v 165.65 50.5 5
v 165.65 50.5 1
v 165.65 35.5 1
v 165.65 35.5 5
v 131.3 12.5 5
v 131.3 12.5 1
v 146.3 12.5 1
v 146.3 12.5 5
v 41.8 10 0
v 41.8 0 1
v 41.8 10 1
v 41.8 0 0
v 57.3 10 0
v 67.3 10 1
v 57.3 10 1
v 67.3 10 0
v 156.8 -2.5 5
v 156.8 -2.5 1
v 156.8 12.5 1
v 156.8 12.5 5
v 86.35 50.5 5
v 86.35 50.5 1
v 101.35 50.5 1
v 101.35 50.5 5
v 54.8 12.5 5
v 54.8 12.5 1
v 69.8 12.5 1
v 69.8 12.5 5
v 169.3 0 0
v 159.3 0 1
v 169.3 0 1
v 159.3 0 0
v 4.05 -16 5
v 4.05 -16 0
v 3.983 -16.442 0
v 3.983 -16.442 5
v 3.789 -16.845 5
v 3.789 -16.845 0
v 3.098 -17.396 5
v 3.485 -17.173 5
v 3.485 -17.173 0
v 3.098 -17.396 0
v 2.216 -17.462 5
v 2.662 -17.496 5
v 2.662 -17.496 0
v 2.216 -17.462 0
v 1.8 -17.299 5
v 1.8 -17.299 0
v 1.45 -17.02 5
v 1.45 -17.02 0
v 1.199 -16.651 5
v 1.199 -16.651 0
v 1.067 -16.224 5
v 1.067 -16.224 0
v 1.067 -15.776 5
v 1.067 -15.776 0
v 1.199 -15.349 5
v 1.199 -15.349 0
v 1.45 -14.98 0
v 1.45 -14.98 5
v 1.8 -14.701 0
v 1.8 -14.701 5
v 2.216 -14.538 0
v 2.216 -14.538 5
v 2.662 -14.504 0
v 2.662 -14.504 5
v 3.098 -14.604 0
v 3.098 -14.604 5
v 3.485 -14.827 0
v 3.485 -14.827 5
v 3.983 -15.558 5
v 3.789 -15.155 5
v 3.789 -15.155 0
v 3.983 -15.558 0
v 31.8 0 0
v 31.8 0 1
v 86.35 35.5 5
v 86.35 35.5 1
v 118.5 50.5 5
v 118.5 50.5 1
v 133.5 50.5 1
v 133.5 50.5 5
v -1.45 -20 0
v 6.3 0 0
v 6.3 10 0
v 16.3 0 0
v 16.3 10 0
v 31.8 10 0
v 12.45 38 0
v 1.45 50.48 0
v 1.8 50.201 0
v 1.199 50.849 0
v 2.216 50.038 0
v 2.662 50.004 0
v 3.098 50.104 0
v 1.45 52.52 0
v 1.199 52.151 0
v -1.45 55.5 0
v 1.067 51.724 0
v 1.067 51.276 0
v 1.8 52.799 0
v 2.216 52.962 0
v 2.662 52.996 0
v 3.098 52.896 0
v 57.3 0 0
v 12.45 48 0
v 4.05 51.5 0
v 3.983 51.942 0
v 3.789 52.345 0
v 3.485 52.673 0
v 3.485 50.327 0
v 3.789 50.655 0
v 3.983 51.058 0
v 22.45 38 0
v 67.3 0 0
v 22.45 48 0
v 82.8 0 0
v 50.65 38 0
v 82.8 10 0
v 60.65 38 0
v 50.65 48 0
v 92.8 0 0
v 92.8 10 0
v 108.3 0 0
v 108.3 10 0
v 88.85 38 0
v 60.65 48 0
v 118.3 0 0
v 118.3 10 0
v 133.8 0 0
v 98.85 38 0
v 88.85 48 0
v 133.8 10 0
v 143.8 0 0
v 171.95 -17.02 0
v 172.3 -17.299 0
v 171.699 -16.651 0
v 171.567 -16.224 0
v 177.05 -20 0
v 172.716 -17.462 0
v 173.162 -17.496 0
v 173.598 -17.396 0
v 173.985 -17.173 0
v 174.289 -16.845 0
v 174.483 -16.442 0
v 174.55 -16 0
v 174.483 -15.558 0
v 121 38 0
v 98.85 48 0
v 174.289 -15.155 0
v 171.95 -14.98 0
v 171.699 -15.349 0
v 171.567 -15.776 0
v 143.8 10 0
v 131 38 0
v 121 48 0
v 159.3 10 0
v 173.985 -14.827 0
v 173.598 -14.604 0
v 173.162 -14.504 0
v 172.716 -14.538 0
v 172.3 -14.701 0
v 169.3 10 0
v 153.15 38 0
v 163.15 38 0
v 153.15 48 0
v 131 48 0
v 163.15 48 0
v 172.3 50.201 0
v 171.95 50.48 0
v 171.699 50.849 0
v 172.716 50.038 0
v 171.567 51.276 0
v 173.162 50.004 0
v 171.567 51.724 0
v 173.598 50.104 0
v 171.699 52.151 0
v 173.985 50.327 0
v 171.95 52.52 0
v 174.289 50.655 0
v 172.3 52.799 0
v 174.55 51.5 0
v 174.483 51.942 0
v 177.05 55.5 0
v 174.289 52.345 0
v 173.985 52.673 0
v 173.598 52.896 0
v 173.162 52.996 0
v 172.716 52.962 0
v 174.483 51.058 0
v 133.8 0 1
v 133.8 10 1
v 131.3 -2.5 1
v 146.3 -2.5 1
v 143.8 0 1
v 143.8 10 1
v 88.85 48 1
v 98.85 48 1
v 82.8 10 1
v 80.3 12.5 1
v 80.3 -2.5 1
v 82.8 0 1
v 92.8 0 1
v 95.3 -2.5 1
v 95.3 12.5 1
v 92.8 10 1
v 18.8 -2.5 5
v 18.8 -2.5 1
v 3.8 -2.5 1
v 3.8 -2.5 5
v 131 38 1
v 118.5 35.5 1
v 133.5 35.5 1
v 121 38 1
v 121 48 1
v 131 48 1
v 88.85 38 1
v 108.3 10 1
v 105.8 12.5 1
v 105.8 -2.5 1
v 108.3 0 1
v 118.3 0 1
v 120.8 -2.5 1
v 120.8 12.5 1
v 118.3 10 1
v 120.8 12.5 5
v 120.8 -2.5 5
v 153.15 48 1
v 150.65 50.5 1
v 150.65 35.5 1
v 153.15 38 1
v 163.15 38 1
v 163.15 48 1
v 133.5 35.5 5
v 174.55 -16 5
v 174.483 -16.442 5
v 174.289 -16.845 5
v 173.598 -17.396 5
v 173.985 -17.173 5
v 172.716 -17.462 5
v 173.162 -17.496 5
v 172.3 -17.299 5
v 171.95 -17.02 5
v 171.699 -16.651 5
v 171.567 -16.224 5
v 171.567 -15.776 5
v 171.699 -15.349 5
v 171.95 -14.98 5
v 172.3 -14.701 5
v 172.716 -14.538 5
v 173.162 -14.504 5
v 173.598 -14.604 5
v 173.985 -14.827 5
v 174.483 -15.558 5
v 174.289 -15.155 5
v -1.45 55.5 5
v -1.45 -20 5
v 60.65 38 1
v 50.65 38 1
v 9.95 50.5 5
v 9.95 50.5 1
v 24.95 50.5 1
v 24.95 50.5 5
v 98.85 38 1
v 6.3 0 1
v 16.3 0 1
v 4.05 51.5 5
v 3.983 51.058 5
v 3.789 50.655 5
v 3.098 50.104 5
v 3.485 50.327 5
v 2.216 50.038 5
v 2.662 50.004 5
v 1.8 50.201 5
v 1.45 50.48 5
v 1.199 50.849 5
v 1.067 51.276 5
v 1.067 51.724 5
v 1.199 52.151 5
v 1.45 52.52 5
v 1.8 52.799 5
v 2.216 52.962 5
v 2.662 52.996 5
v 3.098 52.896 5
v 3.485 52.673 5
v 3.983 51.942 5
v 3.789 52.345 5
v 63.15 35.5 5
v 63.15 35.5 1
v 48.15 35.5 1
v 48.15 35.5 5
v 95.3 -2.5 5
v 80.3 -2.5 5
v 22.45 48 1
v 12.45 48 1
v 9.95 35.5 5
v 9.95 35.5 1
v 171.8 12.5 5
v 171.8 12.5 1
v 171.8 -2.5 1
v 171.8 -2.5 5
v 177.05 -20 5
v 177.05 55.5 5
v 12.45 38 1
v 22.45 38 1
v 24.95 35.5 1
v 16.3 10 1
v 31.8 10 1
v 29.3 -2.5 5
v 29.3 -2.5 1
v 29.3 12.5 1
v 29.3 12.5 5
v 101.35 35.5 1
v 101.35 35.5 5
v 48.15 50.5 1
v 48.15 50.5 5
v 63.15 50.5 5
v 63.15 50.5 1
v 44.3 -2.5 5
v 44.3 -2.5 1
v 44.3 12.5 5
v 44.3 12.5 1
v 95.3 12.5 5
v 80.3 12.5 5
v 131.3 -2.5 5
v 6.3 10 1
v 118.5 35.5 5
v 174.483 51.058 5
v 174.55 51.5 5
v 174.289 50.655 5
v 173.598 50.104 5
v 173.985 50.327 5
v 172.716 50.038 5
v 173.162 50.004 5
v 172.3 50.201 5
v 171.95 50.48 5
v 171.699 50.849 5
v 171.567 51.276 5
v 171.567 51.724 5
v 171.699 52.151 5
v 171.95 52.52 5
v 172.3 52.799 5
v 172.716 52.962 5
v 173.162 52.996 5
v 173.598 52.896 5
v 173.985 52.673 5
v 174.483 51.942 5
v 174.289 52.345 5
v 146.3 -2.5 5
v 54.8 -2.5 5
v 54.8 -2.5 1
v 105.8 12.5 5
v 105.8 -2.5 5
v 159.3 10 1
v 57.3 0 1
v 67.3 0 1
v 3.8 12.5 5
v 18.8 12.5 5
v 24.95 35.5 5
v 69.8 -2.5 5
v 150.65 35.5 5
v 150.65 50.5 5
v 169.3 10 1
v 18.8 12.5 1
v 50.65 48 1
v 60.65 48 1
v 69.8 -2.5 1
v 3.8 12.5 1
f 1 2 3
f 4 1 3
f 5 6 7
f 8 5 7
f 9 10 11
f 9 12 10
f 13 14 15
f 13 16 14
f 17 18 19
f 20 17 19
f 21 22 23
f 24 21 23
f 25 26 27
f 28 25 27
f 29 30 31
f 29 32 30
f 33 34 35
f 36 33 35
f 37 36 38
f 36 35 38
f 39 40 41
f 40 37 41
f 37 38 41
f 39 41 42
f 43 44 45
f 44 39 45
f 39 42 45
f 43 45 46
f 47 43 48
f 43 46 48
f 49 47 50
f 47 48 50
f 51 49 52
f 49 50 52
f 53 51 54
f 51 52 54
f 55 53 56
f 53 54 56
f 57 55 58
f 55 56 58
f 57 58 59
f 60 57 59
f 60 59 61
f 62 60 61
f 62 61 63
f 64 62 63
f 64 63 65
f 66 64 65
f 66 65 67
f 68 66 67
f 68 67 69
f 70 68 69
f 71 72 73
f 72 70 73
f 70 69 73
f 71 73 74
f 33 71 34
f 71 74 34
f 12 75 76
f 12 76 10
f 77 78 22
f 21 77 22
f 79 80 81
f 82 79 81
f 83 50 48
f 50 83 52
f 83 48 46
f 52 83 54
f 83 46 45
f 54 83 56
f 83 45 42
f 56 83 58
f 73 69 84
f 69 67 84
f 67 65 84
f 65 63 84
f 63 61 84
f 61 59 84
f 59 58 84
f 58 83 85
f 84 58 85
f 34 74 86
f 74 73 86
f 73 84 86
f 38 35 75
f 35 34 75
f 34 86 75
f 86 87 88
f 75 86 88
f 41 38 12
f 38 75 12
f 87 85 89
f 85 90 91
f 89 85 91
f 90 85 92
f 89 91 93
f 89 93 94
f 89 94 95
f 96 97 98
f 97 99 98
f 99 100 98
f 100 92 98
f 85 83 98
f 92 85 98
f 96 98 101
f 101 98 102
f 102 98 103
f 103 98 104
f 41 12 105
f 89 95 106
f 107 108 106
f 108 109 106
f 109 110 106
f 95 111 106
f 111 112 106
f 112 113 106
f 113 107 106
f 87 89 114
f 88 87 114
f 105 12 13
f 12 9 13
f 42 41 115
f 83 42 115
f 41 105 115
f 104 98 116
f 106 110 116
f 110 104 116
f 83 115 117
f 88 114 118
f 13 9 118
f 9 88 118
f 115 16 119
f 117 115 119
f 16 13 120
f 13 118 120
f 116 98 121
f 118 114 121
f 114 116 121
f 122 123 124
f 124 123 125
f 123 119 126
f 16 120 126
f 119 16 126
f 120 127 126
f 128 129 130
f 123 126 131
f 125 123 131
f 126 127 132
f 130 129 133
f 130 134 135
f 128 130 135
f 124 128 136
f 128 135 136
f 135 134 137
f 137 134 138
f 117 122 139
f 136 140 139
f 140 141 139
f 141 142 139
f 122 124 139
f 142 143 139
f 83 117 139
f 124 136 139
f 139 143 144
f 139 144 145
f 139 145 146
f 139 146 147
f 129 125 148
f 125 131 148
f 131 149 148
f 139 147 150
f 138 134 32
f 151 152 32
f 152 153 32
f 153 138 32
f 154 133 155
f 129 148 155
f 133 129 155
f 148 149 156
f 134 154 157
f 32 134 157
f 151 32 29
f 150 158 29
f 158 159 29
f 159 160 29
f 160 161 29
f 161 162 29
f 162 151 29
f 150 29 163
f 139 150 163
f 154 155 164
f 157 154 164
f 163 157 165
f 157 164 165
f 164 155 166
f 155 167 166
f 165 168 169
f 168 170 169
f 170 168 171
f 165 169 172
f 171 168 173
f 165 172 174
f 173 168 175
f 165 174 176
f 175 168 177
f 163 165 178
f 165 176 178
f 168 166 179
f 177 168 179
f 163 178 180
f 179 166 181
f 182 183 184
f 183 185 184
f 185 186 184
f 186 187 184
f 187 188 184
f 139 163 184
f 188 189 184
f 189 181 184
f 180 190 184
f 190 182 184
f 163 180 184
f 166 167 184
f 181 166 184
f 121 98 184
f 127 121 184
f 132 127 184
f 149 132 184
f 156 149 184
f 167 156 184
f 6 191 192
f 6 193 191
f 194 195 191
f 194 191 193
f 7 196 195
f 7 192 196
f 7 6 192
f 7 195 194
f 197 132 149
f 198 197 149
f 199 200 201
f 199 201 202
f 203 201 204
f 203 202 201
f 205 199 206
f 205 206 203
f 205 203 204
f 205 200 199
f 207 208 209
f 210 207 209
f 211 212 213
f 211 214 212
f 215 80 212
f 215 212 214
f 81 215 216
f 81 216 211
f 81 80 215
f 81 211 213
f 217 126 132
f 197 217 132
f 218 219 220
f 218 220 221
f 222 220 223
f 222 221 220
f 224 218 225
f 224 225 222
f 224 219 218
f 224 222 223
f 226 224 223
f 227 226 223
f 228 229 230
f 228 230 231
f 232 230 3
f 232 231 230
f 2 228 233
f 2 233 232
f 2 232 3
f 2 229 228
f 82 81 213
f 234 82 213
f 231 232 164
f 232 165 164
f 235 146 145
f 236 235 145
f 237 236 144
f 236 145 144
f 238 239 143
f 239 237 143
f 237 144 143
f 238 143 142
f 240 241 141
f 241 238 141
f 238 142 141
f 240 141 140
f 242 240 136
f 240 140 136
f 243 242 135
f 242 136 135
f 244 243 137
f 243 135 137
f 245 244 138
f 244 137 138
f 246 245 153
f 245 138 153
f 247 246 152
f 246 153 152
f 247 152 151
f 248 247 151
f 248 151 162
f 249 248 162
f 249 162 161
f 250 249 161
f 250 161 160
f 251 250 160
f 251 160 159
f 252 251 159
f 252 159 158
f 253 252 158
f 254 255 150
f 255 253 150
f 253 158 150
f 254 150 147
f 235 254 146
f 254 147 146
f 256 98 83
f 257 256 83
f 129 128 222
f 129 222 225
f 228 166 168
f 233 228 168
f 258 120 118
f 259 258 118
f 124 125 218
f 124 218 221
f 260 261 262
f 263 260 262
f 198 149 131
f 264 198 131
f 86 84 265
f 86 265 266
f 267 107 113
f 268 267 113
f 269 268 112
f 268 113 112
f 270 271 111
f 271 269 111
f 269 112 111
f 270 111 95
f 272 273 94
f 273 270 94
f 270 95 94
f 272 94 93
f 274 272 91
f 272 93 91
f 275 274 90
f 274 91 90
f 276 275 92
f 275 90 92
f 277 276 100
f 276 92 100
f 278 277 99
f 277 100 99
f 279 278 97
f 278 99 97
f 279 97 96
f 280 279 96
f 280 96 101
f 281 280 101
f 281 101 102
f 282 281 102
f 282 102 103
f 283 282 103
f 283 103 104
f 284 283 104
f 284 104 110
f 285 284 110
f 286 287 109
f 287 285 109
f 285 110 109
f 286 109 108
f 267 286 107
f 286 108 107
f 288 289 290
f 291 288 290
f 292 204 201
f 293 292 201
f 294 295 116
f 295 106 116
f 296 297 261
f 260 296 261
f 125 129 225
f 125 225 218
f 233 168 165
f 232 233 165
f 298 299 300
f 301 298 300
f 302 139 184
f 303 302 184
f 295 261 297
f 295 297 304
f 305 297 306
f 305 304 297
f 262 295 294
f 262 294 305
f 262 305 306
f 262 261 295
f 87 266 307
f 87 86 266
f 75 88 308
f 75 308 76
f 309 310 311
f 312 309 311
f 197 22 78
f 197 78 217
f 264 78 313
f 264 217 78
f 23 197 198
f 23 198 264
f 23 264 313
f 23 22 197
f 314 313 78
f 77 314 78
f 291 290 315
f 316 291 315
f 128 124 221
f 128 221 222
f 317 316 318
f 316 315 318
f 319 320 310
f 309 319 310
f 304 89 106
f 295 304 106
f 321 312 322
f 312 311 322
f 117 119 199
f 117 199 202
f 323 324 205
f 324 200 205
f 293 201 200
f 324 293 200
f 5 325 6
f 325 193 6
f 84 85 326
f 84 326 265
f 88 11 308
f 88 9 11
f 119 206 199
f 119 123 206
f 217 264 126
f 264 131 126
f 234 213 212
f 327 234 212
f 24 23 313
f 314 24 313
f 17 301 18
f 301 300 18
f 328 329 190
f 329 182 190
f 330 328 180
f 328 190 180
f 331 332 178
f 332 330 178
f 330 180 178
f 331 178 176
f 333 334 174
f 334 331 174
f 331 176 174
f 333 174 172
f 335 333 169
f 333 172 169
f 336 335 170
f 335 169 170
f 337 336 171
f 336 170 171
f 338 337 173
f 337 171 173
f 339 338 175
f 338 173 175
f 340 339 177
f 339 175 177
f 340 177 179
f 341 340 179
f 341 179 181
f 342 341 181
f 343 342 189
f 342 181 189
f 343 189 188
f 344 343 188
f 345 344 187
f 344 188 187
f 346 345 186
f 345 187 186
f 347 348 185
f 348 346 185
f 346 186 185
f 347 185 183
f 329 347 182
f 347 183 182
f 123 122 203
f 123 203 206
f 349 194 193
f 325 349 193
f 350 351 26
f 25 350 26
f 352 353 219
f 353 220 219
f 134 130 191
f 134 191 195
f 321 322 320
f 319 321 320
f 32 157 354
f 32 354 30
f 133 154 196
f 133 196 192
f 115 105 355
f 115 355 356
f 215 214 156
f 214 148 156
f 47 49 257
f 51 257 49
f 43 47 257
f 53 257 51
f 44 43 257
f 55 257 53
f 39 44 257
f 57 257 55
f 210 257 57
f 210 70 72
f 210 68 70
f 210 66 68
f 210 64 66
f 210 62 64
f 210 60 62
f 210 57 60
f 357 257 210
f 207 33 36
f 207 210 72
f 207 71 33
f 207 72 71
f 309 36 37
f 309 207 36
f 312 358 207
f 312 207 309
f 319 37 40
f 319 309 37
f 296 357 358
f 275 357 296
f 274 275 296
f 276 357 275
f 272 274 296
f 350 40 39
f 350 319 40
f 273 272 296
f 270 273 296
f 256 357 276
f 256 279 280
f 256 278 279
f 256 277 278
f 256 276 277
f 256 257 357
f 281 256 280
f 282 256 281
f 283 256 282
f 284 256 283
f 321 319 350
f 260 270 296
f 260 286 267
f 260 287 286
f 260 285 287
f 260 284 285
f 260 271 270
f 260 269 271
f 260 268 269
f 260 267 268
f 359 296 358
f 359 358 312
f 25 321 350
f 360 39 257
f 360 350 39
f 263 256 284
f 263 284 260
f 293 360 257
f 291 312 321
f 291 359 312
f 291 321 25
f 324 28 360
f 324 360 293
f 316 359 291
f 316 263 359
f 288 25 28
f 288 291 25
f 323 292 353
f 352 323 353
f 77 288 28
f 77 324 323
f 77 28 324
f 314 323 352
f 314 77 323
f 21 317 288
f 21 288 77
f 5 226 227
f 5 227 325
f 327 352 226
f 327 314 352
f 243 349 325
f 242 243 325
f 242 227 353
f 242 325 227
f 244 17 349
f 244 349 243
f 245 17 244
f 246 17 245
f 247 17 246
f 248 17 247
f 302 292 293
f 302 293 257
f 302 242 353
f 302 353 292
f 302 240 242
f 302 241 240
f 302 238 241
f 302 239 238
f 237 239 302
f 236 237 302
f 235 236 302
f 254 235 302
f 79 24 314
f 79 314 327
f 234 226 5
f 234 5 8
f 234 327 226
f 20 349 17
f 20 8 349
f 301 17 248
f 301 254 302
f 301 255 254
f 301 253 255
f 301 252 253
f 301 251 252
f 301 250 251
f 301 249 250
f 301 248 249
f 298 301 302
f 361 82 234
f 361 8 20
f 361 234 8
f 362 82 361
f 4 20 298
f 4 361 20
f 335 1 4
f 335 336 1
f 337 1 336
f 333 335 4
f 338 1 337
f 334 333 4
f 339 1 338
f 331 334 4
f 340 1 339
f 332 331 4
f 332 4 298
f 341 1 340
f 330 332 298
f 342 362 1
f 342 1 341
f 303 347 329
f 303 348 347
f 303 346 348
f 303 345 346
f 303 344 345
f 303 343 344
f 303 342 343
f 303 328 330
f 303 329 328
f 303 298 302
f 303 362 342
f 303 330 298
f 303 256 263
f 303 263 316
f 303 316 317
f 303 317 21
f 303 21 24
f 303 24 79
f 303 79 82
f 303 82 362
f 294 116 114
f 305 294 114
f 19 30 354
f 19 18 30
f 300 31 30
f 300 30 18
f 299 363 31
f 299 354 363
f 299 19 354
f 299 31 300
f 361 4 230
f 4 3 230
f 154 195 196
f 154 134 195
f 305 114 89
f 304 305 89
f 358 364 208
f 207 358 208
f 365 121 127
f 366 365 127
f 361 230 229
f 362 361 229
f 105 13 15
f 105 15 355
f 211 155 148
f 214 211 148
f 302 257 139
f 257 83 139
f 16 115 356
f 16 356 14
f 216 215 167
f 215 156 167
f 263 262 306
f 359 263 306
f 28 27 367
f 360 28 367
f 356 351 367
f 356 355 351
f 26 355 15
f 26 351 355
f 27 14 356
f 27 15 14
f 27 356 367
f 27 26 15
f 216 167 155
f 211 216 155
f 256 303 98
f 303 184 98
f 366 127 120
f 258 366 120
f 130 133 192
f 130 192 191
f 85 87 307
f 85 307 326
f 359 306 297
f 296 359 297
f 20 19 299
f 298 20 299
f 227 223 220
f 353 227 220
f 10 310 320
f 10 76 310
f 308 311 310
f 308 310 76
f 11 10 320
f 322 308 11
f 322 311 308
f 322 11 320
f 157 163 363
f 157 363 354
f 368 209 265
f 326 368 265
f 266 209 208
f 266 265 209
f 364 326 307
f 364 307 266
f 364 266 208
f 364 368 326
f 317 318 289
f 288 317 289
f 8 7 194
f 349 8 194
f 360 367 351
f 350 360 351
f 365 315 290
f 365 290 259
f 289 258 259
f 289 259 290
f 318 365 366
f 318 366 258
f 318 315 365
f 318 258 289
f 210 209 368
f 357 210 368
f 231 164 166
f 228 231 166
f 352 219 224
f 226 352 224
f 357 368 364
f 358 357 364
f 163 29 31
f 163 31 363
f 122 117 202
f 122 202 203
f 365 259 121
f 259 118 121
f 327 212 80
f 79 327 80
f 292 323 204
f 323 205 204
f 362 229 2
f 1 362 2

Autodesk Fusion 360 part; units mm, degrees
sketch "Sketch1" plane through (0, 0, 0) normal (0, 0, 1) x (1, 0, 0)
  line L0 (-23.9041, 0) -> (63.45, 0) construction
  line L1 (78.95, 0) -> (176.0959, 0) construction
  line L2 (-1.45, -20) -> (177.05, -20)
  line L3 (177.05, -20) -> (177.05, 55.5)
  line L4 (177.05, 55.5) -> (-1.45, 55.5)
  line L5 (-1.45, 55.5) -> (-1.45, -20)
  line L6 (6.3, 0) -> (16.3, 0)
  line L7 (16.3, 0) -> (16.3, 10)
  line L8 (16.3, 10) -> (6.3, 10)
  line L9 (6.3, 10) -> (6.3, 0)
  line L10 (31.8, 0) -> (41.8, 0)
  line L11 (41.8, 0) -> (41.8, 10)
  line L12 (41.8, 10) -> (31.8, 10)
  line L13 (31.8, 10) -> (31.8, 0)
  line L14 (57.3, 0) -> (67.3, 0)
  line L15 (67.3, 0) -> (67.3, 10)
  line L16 (67.3, 10) -> (57.3, 10)
  line L17 (57.3, 10) -> (57.3, 0)
  line L18 (82.8, 0) -> (92.8, 0)
  line L19 (92.8, 0) -> (92.8, 10)
  line L20 (92.8, 10) -> (82.8, 10)
  line L21 (82.8, 10) -> (82.8, 0)
  line L22 (108.3, 0) -> (118.3, 0)
  line L23 (118.3, 0) -> (118.3, 10)
  line L24 (118.3, 10) -> (108.3, 10)
  line L25 (108.3, 10) -> (108.3, 0)
  line L26 (133.8, 0) -> (143.8, 0)
  line L27 (143.8, 0) -> (143.8, 10)
  line L28 (143.8, 10) -> (133.8, 10)
  line L29 (133.8, 10) -> (133.8, 0)
  line L30 (159.3, 0) -> (169.3, 0)
  line L31 (169.3, 0) -> (169.3, 10)
  line L32 (169.3, 10) -> (159.3, 10)
  line L33 (159.3, 10) -> (159.3, 0)
  line L34 (12.45, 48) -> (22.45, 48)
  line L35 (22.45, 48) -> (22.45, 38)
  line L36 (22.45, 38) -> (12.45, 38)
  line L37 (12.45, 38) -> (12.45, 48)
  line L38 (50.65, 48) -> (60.65, 48)
  line L39 (60.65, 48) -> (60.65, 38)
  line L40 (60.65, 38) -> (50.65, 38)
  line L41 (50.65, 38) -> (50.65, 48)
  line L42 (88.85, 48) -> (98.85, 48)
  line L43 (98.85, 48) -> (98.85, 38)
  line L44 (98.85, 38) -> (88.85, 38)
  line L45 (88.85, 38) -> (88.85, 48)
  line L46 (121, 48) -> (131, 48)
  line L47 (131, 48) -> (131, 38)
  line L48 (131, 38) -> (121, 38)
  line L49 (121, 38) -> (121, 48)
  line L50 (153.15, 48) -> (163.15, 48)
  line L51 (163.15, 48) -> (163.15, 38)
  line L52 (163.15, 38) -> (153.15, 38)
  line L53 (153.15, 38) -> (153.15, 48)
  line L54 (9.95, 50.5) -> (24.95, 50.5)
  line L55 (24.95, 50.5) -> (24.95, 35.5)
  line L56 (24.95, 35.5) -> (9.95, 35.5)
  line L57 (9.95, 35.5) -> (9.95, 50.5)
  line L58 (9.95, 50.5) -> (24.95, 35.5) construction
  line L59 (24.95, 50.5) -> (9.95, 35.5) construction
  line L60 (48.15, 50.5) -> (63.15, 50.5)
  line L61 (63.15, 50.5) -> (63.15, 35.5)
  line L62 (63.15, 35.5) -> (48.15, 35.5)
  line L63 (48.15, 35.5) -> (48.15, 50.5)
  line L64 (48.15, 50.5) -> (63.15, 35.5) construction
  line L65 (63.15, 50.5) -> (48.15, 35.5) construction
  line L66 (86.35, 50.5) -> (101.35, 50.5)
  line L67 (101.35, 50.5) -> (101.35, 35.5)
  line L68 (101.35, 35.5) -> (86.35, 35.5)
  line L69 (86.35, 35.5) -> (86.35, 50.5)
  line L70 (86.35, 50.5) -> (101.35, 35.5) construction
  line L71 (101.35, 50.5) -> (86.35, 35.5) construction
  line L72 (118.5, 50.5) -> (133.5, 50.5)
  line L73 (133.5, 50.5) -> (133.5, 35.5)
  line L74 (133.5, 35.5) -> (118.5, 35.5)
  line L75 (118.5, 35.5) -> (118.5, 50.5)
  line L76 (118.5, 50.5) -> (133.5, 35.5) construction
  line L77 (133.5, 50.5) -> (118.5, 35.5) construction
  line L78 (150.65, 50.5) -> (165.65, 50.5)
  line L79 (165.65, 50.5) -> (165.65, 35.5)
  line L80 (165.65, 35.5) -> (150.65, 35.5)
  line L81 (150.65, 35.5) -> (150.65, 50.5)
  line L82 (150.65, 50.5) -> (165.65, 35.5) construction
  line L83 (165.65, 50.5) -> (150.65, 35.5) construction
  line L84 (3.8, 12.5) -> (18.8, 12.5)
  line L85 (18.8, 12.5) -> (18.8, -2.5)
  line L86 (18.8, -2.5) -> (3.8, -2.5)
  line L87 (3.8, -2.5) -> (3.8, 12.5)
  line L88 (3.8, 12.5) -> (18.8, -2.5) construction
  line L89 (18.8, 12.5) -> (3.8, -2.5) construction
  line L90 (29.3, 12.5) -> (44.3, 12.5)
  line L91 (44.3, 12.5) -> (44.3, -2.5)
  line L92 (44.3, -2.5) -> (29.3, -2.5)
  line L93 (29.3, -2.5) -> (29.3, 12.5)
  line L94 (29.3, 12.5) -> (44.3, -2.5) construction
  line L95 (44.3, 12.5) -> (29.3, -2.5) construction
  line L96 (54.8, 12.5) -> (69.8, 12.5)
  line L97 (69.8, 12.5) -> (69.8, -2.5)
  line L98 (69.8, -2.5) -> (54.8, -2.5)
  line L99 (54.8, -2.5) -> (54.8, 12.5)
  line L100 (54.8, 12.5) -> (69.8, -2.5) construction
  line L101 (69.8, 12.5) -> (54.8, -2.5) construction
  line L102 (80.3, 12.5) -> (95.3, 12.5)
  line L103 (95.3, 12.5) -> (95.3, -2.5)
  line L104 (95.3, -2.5) -> (80.3, -2.5)
  line L105 (80.3, -2.5) -> (80.3, 12.5)
  line L106 (80.3, 12.5) -> (95.3, -2.5) construction
  line L107 (95.3, 12.5) -> (80.3, -2.5) construction
  line L108 (105.8, 12.5) -> (120.8, 12.5)
  line L109 (120.8, 12.5) -> (120.8, -2.5)
  line L110 (120.8, -2.5) -> (105.8, -2.5)
  line L111 (105.8, -2.5) -> (105.8, 12.5)
  line L112 (105.8, 12.5) -> (120.8, -2.5) construction
  line L113 (120.8, 12.5) -> (105.8, -2.5) construction
  line L114 (131.3, 12.5) -> (146.3, 12.5)
  line L115 (146.3, 12.5) -> (146.3, -2.5)
  line L116 (146.3, -2.5) -> (131.3, -2.5)
  line L117 (131.3, -2.5) -> (131.3, 12.5)
  line L118 (131.3, 12.5) -> (146.3, -2.5) construction
  line L119 (146.3, 12.5) -> (131.3, -2.5) construction
  line L120 (156.8, 12.5) -> (171.8, 12.5)
  line L121 (171.8, 12.5) -> (171.8, -2.5)
  line L122 (171.8, -2.5) -> (156.8, -2.5)
  line L123 (156.8, -2.5) -> (156.8, 12.5)
  line L124 (156.8, 12.5) -> (171.8, -2.5) construction
  line L125 (171.8, 12.5) -> (156.8, -2.5) construction
  circle A0 centre (2.55, 51.5) radius 1.5
  circle A1 centre (2.55, -16) radius 1.5
  circle A2 centre (173.05, -16) radius 1.5
  circle A3 centre (173.05, 51.5) radius 1.5
  point P0 (-11.7503, 0.5527)
  point P1 (17.45, 43)
  point P2 (55.65, 43)
  point P3 (93.85, 43)
  point P4 (126, 43)
  point P5 (158.15, 43)
  point P6 (11.3, 5)
  point P7 (36.8, 5)
  point P8 (62.3, 5)
  point P9 (87.8, 5)
  point P10 (113.3, 5)
  point P11 (138.8, 5)
  point P12 (164.3, 5)
  dimension "d77" = 200
  dimension "d86" = 75.5
  dimension "d89" = 10
  dimension "d90" = 10
  dimension "d91" = 20
  dimension "d92" = 7.75
  dimension "d93" = 10
  dimension "d94" = 10
  dimension "d95" = 10
  dimension "d96" = 10
  dimension "d99" = 10
  dimension "d100" = 10
  dimension "d101" = 15.5
  dimension "d102" = 15.5
  dimension "d104" = 15.5
  dimension "d105" = 10
  dimension "d106" = 10
  dimension "d107" = 15.5
  dimension "d108" = 10
  dimension "d109" = 10
  dimension "d110" = 15.5
  dimension "d111" = 10
  dimension "d112" = 10
  dimension "d113" = 15.5
  dimension "d114" = 10
  dimension "d115" = 10
  dimension "d116" = 13.9
  dimension "d117" = 7.5
  dimension "d118" = 10
  dimension "d119" = 10
  dimension "d120" = 7.5
  dimension "d121" = 28.2
  dimension "d122" = 10
  dimension "d123" = 10
  dimension "d124" = 28.2
  dimension "d125" = 7.5
  dimension "d126" = 10
  dimension "d127" = 10
  dimension "d128" = 22.15
  dimension "d129" = 7.5
  dimension "d130" = 10
  dimension "d131" = 10
  dimension "d132" = 22.15
  dimension "d133" = 7.5
  dimension "d134" = 15
  dimension "d135" = 15
  dimension "d136" = 15
  dimension "d137" = 15
  dimension "d138" = 15
  dimension "d139" = 15
  dimension "d140" = 15
  dimension "d141" = 15
  dimension "d142" = 15
  dimension "d143" = 15
  dimension "d144" = 15
  dimension "d145" = 15
  dimension "d146" = 15
  dimension "d147" = 15
  dimension "d148" = 15
  dimension "d149" = 15
  dimension "d150" = 15
  dimension "d151" = 15
  dimension "d152" = 15
  dimension "d153" = 15
  dimension "d154" = 15
  dimension "d155" = 15
  dimension "d156" = 15
  dimension "d157" = 15
  dimension "d158" = 3
  dimension "d159" = 4
  dimension "d160" = 4
  dimension "d161" = 3
  dimension "d162" = 4
  dimension "d163" = 4
  dimension "d164" = 3
  dimension "d165" = 4
  dimension "d166" = 4
  dimension "d167" = 3
  dimension "d168" = 4
  dimension "d169" = 4
  dimension "d174" = 2.5
  dimension "d175" = 2.5
  dimension "d176" = 2.5
  dimension "d177" = 2.5
  dimension "d178" = 2.5
  dimension "d179" = 2.5
  dimension "d182" = 5.25
  dimension "d183" = 2.5
  dimension "d184" = 2.5
  dimension "d185" = 2.5
  dimension "d186" = 2.5
  dimension "d187" = 2.5
  dimension "d188" = 2.5
  dimension "d189" = 2.5
  dimension "d190" = 2.5
  dimension "d191" = 2.5
  dimension "d192" = 2.5
  dimension "d193" = 2.5
extrude "Extrude1" add sketch "Sketch1" along normal blind 1 contours L54 L55 L56 L57 | L60 L61 L62 L63 | L66 L67 L68 L69 | L72 L73 L74 L75 | L78 L79 L80 L81 | L84 L85 L86 L87 | L90 L91 L92 L93 | L96 L97 L98 L99 | L102 L103 L104 L105 | L108 L109 L110 L111 | L114 L115 L116 L117 | L120 L121 L122 L123 makes body 1 at (140.4667, 11.6667, 0) makes body 2 at (89.4667, 11.6667, 0) makes body 3 at (12.9667, -1.6667, 0) makes body 4 at (35.1333, 11.6667, 0) makes body 5 at (95.5167, 36.3333, 0) makes body 6 at (151.4833, 41.3333, 0) makes body 7 at (119.3333, 41.3333, 0) makes body 8 at (60.6333, -1.6667, 0) makes body 9 at (24.1167, 44.6667, 0) makes body 10 at (57.3167, 49.6667, 0) makes body 11 at (114.9667, -1.6667, 0) makes body 12 at (162.6333, 11.6667, 0)
extrude "Extrude2" add sketch "Sketch1" along normal blind 5 contours L2 L3 L4 L5 bodies 1 2 3 4 5 6 7 8 9 10 11 12
